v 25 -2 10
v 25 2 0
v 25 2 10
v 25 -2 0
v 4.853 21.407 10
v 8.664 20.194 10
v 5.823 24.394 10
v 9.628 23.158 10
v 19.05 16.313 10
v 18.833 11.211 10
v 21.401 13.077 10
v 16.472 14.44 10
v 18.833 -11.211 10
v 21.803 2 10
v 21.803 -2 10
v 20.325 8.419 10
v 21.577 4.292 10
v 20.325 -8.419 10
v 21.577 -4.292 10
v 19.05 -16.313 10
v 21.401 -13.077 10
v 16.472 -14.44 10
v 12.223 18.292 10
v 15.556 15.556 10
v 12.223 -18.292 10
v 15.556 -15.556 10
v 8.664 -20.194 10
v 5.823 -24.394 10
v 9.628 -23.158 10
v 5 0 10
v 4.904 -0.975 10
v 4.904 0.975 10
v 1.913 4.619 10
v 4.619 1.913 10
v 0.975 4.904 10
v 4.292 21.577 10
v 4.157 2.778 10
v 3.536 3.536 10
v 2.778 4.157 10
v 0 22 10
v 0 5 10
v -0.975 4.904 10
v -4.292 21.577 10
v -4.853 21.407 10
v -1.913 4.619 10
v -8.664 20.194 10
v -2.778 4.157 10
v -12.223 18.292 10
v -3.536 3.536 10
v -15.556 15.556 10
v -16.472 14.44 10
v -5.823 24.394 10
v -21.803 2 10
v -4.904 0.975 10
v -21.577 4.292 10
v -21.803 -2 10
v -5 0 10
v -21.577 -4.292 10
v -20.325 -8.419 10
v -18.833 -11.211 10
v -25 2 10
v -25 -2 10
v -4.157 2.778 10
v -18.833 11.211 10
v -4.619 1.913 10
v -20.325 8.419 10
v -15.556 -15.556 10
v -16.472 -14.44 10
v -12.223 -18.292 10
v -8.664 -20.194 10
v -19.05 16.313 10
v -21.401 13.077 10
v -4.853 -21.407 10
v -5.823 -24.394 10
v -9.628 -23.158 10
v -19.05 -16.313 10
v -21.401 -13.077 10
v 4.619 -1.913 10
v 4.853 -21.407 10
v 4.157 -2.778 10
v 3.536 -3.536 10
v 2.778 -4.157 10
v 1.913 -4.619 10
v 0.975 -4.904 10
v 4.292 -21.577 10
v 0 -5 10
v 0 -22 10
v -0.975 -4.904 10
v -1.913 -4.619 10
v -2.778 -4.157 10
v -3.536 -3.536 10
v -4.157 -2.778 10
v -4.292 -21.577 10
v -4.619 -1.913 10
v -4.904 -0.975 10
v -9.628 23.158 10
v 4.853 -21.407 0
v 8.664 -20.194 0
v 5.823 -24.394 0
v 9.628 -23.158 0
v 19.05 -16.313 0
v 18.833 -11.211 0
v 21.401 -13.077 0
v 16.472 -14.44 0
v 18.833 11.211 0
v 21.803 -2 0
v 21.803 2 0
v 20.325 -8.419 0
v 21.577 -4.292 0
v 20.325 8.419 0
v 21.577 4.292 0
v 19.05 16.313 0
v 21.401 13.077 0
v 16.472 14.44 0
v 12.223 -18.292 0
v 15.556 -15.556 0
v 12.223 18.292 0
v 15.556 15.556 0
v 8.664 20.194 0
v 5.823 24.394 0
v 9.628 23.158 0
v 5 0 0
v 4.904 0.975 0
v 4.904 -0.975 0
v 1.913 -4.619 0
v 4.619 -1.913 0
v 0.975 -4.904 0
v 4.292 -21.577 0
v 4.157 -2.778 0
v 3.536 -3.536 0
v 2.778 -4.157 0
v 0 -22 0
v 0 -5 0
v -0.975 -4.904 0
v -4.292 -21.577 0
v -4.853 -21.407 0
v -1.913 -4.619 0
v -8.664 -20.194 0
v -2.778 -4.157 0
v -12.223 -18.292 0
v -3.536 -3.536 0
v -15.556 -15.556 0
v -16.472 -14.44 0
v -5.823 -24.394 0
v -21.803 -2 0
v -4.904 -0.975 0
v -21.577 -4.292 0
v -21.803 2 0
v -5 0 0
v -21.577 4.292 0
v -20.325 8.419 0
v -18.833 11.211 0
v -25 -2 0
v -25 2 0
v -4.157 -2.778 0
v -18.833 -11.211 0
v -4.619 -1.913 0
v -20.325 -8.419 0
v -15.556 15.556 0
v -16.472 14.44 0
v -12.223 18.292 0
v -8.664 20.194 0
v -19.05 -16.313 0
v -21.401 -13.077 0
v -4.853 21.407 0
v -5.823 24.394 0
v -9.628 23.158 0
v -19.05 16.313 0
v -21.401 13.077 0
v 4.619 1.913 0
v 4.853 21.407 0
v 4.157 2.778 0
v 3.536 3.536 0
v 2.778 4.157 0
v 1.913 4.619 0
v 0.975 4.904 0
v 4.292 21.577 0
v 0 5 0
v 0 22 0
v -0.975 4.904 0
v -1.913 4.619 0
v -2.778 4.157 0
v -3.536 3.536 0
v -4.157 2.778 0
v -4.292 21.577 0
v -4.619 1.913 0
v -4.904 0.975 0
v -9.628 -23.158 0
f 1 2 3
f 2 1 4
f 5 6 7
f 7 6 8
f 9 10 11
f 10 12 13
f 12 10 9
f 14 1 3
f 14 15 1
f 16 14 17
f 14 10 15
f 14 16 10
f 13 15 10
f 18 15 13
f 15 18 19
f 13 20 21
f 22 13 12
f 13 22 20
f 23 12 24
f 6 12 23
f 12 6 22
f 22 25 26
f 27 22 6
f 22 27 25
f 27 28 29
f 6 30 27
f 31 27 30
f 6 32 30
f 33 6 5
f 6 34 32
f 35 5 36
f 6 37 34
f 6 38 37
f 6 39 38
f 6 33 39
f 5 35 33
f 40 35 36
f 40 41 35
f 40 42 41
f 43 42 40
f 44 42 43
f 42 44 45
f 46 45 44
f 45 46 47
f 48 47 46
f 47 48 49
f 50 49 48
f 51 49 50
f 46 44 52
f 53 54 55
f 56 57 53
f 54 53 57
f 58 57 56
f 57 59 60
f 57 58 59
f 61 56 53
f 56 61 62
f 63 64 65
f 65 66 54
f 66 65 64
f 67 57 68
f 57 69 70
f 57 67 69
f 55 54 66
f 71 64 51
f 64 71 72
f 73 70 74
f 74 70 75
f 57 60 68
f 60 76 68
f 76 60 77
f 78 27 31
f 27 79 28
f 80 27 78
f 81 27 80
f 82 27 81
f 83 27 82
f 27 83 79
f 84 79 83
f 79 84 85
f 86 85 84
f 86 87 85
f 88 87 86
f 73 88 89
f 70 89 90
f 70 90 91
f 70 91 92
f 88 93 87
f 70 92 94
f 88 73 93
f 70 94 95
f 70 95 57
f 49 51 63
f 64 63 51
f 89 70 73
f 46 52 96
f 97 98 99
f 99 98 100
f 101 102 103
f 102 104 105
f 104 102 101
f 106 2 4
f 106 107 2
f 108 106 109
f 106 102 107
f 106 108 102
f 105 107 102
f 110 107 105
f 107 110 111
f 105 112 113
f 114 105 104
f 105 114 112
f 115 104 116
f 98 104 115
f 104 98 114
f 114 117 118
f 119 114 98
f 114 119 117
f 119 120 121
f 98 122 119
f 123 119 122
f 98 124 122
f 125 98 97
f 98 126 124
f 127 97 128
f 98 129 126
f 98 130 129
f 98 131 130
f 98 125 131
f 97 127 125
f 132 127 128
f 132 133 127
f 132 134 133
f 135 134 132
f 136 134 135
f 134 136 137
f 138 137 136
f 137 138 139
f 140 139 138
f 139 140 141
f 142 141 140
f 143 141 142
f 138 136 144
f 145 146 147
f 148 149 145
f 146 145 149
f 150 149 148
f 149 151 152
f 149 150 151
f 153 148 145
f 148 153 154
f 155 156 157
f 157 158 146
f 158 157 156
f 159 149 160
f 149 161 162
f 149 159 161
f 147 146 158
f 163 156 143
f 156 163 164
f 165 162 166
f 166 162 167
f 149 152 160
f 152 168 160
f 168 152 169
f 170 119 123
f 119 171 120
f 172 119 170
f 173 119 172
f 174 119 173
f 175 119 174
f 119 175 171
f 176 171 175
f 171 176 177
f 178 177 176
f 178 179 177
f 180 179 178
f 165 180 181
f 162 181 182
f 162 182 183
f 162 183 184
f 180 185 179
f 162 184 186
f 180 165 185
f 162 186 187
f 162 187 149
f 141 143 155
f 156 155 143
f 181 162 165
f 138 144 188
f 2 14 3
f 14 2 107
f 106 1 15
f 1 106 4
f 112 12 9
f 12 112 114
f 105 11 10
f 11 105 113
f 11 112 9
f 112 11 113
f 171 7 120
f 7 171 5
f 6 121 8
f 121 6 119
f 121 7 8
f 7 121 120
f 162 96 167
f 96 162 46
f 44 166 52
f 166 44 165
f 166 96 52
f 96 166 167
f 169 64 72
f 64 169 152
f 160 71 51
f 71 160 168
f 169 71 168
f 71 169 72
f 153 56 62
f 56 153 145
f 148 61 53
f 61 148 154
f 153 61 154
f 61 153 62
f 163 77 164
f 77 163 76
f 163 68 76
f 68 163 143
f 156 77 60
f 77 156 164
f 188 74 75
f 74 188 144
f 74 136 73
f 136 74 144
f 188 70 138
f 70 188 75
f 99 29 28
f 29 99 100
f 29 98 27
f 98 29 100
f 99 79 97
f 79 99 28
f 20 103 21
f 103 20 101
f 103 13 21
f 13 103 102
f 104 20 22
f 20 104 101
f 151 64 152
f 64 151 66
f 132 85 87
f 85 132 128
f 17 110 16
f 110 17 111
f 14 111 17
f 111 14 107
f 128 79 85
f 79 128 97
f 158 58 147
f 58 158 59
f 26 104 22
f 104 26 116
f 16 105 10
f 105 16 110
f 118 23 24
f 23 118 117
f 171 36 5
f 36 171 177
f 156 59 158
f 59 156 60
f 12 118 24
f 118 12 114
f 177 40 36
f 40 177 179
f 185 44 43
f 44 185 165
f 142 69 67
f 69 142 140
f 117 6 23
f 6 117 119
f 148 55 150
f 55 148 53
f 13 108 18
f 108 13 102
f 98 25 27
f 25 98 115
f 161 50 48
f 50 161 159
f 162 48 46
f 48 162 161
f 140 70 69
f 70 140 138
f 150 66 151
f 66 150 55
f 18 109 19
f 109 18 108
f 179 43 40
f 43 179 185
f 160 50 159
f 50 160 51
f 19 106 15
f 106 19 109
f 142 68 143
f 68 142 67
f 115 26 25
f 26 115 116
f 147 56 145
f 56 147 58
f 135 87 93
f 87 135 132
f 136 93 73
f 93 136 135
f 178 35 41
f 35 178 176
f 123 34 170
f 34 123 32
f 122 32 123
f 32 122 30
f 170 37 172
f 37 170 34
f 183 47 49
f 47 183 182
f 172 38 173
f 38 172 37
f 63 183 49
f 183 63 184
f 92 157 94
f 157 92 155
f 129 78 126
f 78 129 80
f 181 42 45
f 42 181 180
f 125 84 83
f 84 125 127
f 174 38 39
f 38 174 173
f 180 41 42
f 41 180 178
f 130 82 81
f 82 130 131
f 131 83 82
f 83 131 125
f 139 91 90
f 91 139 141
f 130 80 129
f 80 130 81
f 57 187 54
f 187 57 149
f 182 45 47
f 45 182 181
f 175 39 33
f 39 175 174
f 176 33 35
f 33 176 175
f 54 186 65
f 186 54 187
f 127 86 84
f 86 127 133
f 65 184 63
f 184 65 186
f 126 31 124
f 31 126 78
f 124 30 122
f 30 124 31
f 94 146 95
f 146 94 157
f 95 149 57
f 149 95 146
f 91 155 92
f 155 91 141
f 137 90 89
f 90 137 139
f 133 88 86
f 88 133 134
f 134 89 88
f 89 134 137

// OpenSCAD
$fn = 32;

// ----------------------------------------------------------------------
// Spur blank: bored gear blank
// ----------------------------------------------------------------------

// --- parameters (mm) ---
disc_r = 22;              // blank root radius
disc_t = 10;              // blank thickness
n_teeth = 10;             // stub tooth count
tooth_w = 4;              // tooth width at the root
tooth_h = 3;              // tooth height above the root
bore_r = 5;               // central bore radius

out_r = disc_r + tooth_h;  // tip radius
bbox_x = 50.0;  // measured width over the teeth
bbox_y = 48.79;  // measured depth over the teeth

difference() {
union() {
  cylinder(r = disc_r, h = disc_t);
  for (i = [0 : n_teeth - 1])
    rotate([0, 0, i * 360 / n_teeth])
      translate([disc_r - 1, -tooth_w / 2, 0])
        cube([tooth_h + 1, tooth_w, disc_t]);
}
  translate([0, 0, -1]) cylinder(r = bore_r, h = disc_t + 2);
}
